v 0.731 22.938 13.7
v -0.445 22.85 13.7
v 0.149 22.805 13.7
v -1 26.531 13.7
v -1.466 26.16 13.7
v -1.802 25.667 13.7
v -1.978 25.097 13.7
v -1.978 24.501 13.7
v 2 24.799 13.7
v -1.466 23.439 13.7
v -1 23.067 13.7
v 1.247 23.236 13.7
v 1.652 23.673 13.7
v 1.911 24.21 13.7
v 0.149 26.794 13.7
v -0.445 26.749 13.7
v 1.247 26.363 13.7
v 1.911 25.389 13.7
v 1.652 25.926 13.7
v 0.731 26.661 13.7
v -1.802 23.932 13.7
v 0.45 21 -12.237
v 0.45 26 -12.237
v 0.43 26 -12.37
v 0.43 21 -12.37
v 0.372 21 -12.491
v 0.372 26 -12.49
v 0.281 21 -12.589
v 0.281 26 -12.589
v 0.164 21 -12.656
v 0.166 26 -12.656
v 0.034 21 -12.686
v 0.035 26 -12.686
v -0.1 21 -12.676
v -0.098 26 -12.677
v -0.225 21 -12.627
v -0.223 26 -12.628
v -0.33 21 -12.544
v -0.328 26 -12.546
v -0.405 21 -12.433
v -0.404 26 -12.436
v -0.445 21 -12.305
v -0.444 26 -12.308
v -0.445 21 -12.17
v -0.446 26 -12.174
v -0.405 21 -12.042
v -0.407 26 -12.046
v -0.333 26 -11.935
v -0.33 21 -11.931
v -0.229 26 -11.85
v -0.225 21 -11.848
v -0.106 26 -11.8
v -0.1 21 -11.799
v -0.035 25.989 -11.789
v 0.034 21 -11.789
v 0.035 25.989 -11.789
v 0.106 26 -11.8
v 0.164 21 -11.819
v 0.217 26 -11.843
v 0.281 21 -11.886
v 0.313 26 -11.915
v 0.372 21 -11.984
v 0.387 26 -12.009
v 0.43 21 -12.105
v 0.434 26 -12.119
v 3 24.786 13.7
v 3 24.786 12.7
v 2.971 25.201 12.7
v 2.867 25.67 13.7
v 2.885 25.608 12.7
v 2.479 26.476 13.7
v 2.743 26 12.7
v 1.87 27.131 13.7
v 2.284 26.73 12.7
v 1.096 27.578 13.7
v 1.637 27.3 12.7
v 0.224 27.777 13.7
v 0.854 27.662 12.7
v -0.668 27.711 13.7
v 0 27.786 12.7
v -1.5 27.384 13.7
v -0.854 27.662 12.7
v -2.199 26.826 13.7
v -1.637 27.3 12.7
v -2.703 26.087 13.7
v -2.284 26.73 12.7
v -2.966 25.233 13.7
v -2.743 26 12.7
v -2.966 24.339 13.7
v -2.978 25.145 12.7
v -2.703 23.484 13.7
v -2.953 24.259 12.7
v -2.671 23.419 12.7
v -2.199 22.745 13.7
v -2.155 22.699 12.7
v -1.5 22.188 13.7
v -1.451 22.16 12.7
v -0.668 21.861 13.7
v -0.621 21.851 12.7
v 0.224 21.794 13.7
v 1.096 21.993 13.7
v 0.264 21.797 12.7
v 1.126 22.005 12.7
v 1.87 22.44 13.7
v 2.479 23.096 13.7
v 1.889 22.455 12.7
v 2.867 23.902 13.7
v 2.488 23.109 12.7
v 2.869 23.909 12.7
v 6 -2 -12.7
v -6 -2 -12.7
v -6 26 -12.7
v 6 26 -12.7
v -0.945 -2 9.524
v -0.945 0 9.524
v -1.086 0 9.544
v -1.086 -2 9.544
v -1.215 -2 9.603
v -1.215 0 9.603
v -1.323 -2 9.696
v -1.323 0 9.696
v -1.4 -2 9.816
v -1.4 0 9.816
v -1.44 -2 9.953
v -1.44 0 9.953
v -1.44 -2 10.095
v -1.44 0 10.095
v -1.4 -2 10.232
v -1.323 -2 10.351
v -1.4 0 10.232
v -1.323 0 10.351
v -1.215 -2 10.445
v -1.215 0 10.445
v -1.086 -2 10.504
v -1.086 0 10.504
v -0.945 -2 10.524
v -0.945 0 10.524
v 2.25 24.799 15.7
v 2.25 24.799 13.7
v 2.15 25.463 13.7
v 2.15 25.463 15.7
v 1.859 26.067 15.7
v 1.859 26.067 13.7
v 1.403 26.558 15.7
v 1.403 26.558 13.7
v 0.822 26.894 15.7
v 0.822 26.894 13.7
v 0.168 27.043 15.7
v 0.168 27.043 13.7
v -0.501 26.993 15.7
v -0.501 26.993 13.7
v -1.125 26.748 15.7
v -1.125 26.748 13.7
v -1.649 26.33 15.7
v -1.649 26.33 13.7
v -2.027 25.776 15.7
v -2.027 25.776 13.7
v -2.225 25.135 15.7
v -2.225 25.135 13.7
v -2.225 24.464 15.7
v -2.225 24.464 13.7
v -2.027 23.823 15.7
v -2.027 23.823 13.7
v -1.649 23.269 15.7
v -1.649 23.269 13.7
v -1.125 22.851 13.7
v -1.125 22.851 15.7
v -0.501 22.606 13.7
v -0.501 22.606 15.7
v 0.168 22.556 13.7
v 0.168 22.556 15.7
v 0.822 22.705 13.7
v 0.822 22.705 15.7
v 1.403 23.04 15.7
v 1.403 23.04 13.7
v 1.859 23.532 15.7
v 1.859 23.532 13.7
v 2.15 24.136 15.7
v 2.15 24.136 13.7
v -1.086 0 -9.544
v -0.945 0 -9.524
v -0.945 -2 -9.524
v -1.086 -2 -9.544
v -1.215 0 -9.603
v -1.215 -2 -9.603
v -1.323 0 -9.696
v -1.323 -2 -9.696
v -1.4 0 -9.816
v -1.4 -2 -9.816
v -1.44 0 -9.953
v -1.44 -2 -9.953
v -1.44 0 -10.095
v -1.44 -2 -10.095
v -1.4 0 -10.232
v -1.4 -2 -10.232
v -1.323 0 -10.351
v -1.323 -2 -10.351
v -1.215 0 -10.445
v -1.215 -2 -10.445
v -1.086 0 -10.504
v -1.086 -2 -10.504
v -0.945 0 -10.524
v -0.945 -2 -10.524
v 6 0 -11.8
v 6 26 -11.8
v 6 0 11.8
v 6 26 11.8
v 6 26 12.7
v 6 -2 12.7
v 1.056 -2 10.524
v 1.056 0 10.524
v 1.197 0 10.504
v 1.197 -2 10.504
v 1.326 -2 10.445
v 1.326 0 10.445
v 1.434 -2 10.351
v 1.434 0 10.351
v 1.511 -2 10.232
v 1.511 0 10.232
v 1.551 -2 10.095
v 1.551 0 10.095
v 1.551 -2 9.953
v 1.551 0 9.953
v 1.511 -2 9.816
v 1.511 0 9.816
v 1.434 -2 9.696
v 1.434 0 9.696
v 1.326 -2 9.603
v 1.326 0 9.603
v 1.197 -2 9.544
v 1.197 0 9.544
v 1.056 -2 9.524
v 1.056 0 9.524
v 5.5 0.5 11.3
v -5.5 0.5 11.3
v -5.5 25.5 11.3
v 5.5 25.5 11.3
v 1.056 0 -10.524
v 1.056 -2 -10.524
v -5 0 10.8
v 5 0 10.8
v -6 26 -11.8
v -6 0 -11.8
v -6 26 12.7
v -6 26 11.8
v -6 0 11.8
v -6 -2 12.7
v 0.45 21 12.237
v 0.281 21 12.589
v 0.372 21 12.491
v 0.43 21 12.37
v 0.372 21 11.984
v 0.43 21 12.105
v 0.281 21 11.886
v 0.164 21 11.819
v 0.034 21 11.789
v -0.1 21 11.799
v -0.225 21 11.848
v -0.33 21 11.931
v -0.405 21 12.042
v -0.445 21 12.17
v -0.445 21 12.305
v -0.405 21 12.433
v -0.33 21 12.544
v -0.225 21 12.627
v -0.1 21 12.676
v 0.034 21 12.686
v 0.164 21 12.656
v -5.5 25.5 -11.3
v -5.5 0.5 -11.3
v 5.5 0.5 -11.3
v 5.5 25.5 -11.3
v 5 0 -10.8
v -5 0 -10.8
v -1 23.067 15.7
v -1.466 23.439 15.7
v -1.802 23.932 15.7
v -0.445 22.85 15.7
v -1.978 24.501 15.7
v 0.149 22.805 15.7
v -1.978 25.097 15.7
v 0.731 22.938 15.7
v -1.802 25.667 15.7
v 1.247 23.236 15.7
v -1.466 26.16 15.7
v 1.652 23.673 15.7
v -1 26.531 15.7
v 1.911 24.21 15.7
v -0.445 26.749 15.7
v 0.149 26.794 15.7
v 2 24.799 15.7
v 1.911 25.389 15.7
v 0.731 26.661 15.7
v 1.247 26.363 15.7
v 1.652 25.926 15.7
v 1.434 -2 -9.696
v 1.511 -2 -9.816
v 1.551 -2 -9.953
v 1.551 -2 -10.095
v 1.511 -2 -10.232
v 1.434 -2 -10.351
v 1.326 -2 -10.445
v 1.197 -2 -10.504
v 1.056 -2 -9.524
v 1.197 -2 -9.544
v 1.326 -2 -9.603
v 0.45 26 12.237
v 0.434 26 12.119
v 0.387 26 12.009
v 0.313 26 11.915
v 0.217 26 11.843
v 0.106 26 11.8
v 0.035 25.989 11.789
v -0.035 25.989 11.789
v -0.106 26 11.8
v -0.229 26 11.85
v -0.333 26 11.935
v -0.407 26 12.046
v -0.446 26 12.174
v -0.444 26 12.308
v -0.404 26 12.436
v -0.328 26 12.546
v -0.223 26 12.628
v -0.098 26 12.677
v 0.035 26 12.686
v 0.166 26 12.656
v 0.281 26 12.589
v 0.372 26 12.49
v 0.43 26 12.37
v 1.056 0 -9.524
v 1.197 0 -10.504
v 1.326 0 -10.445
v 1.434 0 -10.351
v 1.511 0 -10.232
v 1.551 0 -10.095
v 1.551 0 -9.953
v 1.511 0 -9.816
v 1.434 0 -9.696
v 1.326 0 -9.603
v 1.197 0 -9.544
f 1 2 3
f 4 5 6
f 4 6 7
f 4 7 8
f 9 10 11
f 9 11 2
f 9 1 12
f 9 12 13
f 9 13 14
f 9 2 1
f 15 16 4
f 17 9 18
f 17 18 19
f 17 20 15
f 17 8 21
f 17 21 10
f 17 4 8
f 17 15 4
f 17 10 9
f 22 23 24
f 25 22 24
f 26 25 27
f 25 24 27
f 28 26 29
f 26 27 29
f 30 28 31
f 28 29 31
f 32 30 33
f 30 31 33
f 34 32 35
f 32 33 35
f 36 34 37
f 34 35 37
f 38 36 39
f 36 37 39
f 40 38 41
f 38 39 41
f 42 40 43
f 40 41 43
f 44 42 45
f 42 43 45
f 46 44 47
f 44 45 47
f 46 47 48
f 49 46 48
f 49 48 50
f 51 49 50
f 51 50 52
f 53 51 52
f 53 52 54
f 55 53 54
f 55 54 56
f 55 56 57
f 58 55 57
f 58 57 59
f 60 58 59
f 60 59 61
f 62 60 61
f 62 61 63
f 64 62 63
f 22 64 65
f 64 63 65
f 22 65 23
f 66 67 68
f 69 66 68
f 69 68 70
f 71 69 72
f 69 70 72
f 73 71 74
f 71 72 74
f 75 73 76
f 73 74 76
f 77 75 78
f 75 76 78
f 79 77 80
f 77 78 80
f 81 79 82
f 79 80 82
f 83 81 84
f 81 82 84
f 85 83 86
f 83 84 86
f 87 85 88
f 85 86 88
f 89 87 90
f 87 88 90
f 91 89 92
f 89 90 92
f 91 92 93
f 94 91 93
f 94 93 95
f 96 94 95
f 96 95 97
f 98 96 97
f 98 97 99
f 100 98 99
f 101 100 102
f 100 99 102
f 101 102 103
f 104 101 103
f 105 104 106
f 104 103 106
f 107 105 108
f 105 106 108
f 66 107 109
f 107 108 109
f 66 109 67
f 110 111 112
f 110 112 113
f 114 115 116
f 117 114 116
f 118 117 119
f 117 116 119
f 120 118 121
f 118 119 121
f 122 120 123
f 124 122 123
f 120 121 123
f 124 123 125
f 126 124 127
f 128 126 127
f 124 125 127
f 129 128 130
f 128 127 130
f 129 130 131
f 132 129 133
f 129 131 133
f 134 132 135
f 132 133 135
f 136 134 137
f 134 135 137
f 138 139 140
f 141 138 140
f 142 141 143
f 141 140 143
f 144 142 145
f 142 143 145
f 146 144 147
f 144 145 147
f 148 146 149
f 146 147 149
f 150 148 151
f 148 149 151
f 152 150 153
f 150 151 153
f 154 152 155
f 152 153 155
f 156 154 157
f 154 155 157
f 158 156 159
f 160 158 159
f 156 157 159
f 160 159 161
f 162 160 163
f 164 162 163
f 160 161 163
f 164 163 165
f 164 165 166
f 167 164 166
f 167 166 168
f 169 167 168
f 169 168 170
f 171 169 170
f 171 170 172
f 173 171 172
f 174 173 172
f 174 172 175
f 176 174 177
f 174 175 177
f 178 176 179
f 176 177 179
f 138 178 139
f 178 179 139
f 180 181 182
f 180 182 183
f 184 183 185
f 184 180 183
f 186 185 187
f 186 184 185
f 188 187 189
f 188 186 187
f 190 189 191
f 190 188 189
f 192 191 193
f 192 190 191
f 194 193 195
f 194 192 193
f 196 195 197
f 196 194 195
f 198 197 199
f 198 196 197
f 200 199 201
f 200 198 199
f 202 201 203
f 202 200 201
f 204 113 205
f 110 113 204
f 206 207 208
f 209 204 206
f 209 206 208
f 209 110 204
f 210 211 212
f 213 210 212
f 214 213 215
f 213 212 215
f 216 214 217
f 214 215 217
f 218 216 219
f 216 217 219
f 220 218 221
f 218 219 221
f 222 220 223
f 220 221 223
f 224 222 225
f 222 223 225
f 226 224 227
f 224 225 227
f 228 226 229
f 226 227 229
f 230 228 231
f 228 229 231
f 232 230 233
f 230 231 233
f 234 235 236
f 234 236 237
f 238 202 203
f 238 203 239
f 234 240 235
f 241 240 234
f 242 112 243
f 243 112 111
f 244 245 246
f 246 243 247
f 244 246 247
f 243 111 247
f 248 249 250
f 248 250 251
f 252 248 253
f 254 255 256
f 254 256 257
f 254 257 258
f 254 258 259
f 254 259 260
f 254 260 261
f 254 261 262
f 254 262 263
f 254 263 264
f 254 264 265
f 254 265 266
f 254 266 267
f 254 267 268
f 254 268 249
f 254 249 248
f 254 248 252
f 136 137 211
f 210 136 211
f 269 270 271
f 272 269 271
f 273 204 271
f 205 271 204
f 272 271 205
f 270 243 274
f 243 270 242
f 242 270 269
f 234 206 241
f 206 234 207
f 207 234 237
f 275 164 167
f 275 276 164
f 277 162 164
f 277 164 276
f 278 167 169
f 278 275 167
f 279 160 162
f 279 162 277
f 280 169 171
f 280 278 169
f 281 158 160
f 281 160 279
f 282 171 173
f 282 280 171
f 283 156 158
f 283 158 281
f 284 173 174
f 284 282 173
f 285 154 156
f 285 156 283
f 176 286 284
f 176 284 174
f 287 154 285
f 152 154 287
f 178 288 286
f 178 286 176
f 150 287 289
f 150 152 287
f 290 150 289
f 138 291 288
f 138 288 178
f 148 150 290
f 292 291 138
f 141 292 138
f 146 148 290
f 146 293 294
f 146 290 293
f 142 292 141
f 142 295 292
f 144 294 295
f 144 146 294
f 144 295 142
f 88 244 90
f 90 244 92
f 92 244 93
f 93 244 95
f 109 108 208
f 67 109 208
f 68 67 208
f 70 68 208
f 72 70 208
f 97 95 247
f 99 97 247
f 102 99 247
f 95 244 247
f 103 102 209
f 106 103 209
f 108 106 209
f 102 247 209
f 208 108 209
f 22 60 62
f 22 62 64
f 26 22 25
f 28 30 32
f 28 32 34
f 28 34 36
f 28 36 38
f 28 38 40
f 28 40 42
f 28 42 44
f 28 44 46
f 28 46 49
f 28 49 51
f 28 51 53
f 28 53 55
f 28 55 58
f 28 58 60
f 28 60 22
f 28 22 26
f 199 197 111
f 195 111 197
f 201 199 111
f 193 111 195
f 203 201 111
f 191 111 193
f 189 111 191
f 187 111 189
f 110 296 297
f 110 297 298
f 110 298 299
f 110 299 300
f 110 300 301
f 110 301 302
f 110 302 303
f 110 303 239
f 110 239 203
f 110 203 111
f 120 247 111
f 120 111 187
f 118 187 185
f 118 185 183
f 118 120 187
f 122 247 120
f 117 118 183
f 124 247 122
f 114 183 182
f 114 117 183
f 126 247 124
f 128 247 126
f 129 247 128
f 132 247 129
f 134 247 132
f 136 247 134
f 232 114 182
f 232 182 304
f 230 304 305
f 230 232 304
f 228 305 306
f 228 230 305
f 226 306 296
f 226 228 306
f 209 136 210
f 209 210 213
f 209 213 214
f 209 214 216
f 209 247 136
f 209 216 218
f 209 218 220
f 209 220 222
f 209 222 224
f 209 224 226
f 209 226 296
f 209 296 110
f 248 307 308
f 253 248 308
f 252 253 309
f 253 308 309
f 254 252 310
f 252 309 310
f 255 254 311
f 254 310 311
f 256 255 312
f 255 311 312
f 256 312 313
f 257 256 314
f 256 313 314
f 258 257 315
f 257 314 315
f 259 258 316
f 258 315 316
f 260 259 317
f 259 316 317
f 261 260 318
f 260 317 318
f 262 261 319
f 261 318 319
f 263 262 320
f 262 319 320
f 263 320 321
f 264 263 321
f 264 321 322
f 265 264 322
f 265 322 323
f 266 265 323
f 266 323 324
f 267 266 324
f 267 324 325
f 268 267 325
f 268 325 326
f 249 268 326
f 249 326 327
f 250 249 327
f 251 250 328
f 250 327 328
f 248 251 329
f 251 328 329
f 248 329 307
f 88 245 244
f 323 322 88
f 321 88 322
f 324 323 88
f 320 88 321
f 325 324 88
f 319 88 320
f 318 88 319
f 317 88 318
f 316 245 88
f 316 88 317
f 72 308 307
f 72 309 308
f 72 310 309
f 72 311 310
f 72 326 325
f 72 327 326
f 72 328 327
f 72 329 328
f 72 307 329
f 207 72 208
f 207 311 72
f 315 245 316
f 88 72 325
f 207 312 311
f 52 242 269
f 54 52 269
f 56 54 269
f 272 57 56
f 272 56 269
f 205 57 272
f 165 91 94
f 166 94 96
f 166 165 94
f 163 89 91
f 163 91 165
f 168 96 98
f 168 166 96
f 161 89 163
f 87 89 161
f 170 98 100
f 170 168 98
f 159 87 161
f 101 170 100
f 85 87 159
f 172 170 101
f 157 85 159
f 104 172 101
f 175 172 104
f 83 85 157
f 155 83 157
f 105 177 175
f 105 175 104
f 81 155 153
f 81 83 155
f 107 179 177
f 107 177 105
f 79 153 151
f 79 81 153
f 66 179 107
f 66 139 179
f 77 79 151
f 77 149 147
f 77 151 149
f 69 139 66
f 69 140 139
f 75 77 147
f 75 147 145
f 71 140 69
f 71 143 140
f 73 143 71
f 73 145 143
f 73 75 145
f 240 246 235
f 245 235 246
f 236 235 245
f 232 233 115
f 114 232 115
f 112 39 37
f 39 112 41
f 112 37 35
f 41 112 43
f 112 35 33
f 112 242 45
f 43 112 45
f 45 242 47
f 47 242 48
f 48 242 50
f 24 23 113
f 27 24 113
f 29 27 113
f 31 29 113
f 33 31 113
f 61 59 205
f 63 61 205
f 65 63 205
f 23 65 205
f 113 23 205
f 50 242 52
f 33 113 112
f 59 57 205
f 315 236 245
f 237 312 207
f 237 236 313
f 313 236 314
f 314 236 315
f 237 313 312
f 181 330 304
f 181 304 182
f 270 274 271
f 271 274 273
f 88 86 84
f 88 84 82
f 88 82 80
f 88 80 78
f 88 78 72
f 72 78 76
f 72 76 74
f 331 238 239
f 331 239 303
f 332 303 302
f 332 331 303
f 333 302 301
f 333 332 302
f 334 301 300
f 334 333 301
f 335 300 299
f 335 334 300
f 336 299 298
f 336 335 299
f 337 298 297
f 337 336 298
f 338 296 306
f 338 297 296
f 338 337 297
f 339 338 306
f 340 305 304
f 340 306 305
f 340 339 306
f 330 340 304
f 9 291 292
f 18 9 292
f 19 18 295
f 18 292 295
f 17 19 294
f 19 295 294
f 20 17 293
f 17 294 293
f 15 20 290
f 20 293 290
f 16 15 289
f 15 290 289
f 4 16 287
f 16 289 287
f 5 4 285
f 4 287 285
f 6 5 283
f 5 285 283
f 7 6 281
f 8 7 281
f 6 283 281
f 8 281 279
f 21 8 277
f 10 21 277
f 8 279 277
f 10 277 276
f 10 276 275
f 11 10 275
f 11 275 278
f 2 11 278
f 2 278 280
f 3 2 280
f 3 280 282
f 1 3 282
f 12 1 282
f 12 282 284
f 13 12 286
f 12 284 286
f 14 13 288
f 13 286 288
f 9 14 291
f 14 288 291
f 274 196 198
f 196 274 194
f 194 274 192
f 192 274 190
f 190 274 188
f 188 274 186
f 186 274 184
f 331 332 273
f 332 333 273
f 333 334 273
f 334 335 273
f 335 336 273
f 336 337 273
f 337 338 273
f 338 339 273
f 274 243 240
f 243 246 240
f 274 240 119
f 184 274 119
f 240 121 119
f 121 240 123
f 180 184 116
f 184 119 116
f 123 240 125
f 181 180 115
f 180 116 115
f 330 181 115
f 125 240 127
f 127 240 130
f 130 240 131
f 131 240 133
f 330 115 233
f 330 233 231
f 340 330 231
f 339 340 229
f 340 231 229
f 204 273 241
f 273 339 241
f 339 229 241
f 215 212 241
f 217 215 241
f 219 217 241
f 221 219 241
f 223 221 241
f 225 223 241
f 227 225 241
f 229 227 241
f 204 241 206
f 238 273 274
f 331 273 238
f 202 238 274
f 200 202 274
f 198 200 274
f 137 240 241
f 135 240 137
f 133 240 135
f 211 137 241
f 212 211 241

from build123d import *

# Parameters (mm, degrees)
SKETCH1_W           = 12
SKETCH1_H           = 12.7
BOSS_EXTRUDE1_DEPTH = 2
SKETCH2_W           = 12
SKETCH2_H           = 1.4
BOSS_EXTRUDE2_DEPTH = 26
CHAMFER1_SIZE       = 0.5
CHAMFER2_SIZE       = 0.5
SKETCH3_R           = 0.45
CUT_EXTRUDE1_DEPTH  = 5
CUT_EXTRUDE2_DEPTH  = 5
SKETCH5_R           = 3
BOSS_EXTRUDE3_DEPTH = 1
SKETCH6_R           = 2.25
BOSS_EXTRUDE4_DEPTH = 2
SKETCH7_R           = 2
CUT_EXTRUDE3_DEPTH  = 2


with BuildPart() as part:
    # Sketch1 → Boss-Extrude1 (new body)
    with BuildSketch(Plane(origin=(0, 0, 0), x_dir=(1, 0, 0), z_dir=(0, 1, 0))):
        with Locations((0, -6.35)):
            Rectangle(SKETCH1_W, SKETCH1_H)
    boss_extrude1 = extrude(amount=-BOSS_EXTRUDE1_DEPTH)

    # Sketch2 → Boss-Extrude2 (add)
    with BuildSketch(Plane(origin=(0, 0, 0), x_dir=(1, 0, 0), z_dir=(0, 1, 0))):
        with Locations((0, -12)):
            Rectangle(SKETCH2_W, SKETCH2_H)
    boss_extrude2 = extrude(amount=BOSS_EXTRUDE2_DEPTH)

    # Mirror1: Boss-Extrude1, Boss-Extrude2 across plane
    add(boss_extrude1.mirror(Plane.XY))
    add(boss_extrude2.mirror(Plane.XY))

    # Chamfer1
    chamfer1_edges = [part.edges().sort_by_distance(p)[0] for p in [
        (-6, 13, 11.3),
        (6, 13, 11.3),
        (0, 26, 11.3),
        (0, 26, -11.3),
        (-6, 13, -11.3),
        (6, 13, -11.3),
    ]]
    chamfer(chamfer1_edges, length=CHAMFER1_SIZE)

    # Chamfer2
    chamfer2_edges = [part.edges().sort_by_distance(p)[0] for p in [
        (0, 0, -11.3),
        (0, 0, 11.3),
    ]]
    chamfer(chamfer2_edges, length=CHAMFER2_SIZE)

    # Sketch3 → Cut-Extrude1 (cut)
    with BuildSketch(Plane(origin=(0, 26, 0), x_dir=(1, 0, 0), z_dir=(0, 1, 0))):
        with Locations((0, -12.237441552)):
            Circle(SKETCH3_R)
        with Locations((0, 12.237441552)):
            Circle(SKETCH3_R)
    extrude(amount=-CUT_EXTRUDE1_DEPTH, mode=Mode.SUBTRACT)

    # Sketch4 → Cut-Extrude2 (cut)
    with BuildSketch(Plane(origin=(0, 0, 0), x_dir=(1, 0, 0), z_dir=(0, 1, 0))):
        with BuildLine():
            Line((-0.944927116, 10.523894152), (1.056095012, 10.523894152))
            ThreePointArc((1.056095012, 10.523894152), (1.556095012, 10.023894152), (1.056095012, 9.523894152))
            Line((1.056095012, 9.523894152), (-0.944927116, 9.523894152))
            ThreePointArc((-0.944927116, 9.523894152), (-1.444927116, 10.023894152), (-0.944927116, 10.523894152))
        make_face()
        with BuildLine():
            Line((-0.944927116, -10.523894152), (1.056095012, -10.523894152))
            ThreePointArc((1.056095012, -10.523894152), (1.556095012, -10.023894152), (1.056095012, -9.523894152))
            Line((1.056095012, -9.523894152), (-0.944927116, -9.523894152))
            ThreePointArc((-0.944927116, -9.523894152), (-1.444927116, -10.023894152), (-0.944927116, -10.523894152))
        make_face()
    extrude(amount=-CUT_EXTRUDE2_DEPTH, mode=Mode.SUBTRACT)

    # Sketch5 → Boss-Extrude3 (add)
    with BuildSketch(Plane.XY.offset(12.7)):
        with Locations((0, 24.785766933)):
            Circle(SKETCH5_R)
    extrude(amount=BOSS_EXTRUDE3_DEPTH)

    # Sketch6 → Boss-Extrude4 (add)
    with BuildSketch(Plane.XY.offset(13.7)):
        with Locations((0, 24.799373819)):
            Circle(SKETCH6_R)
    extrude(amount=BOSS_EXTRUDE4_DEPTH)

    # Sketch7 → Cut-Extrude3 (cut)
    with BuildSketch(Plane.XY.offset(15.7)):
        with Locations((0, 24.799373819)):
            Circle(SKETCH7_R)
    extrude(amount=-CUT_EXTRUDE3_DEPTH, mode=Mode.SUBTRACT)


solid = part.part
